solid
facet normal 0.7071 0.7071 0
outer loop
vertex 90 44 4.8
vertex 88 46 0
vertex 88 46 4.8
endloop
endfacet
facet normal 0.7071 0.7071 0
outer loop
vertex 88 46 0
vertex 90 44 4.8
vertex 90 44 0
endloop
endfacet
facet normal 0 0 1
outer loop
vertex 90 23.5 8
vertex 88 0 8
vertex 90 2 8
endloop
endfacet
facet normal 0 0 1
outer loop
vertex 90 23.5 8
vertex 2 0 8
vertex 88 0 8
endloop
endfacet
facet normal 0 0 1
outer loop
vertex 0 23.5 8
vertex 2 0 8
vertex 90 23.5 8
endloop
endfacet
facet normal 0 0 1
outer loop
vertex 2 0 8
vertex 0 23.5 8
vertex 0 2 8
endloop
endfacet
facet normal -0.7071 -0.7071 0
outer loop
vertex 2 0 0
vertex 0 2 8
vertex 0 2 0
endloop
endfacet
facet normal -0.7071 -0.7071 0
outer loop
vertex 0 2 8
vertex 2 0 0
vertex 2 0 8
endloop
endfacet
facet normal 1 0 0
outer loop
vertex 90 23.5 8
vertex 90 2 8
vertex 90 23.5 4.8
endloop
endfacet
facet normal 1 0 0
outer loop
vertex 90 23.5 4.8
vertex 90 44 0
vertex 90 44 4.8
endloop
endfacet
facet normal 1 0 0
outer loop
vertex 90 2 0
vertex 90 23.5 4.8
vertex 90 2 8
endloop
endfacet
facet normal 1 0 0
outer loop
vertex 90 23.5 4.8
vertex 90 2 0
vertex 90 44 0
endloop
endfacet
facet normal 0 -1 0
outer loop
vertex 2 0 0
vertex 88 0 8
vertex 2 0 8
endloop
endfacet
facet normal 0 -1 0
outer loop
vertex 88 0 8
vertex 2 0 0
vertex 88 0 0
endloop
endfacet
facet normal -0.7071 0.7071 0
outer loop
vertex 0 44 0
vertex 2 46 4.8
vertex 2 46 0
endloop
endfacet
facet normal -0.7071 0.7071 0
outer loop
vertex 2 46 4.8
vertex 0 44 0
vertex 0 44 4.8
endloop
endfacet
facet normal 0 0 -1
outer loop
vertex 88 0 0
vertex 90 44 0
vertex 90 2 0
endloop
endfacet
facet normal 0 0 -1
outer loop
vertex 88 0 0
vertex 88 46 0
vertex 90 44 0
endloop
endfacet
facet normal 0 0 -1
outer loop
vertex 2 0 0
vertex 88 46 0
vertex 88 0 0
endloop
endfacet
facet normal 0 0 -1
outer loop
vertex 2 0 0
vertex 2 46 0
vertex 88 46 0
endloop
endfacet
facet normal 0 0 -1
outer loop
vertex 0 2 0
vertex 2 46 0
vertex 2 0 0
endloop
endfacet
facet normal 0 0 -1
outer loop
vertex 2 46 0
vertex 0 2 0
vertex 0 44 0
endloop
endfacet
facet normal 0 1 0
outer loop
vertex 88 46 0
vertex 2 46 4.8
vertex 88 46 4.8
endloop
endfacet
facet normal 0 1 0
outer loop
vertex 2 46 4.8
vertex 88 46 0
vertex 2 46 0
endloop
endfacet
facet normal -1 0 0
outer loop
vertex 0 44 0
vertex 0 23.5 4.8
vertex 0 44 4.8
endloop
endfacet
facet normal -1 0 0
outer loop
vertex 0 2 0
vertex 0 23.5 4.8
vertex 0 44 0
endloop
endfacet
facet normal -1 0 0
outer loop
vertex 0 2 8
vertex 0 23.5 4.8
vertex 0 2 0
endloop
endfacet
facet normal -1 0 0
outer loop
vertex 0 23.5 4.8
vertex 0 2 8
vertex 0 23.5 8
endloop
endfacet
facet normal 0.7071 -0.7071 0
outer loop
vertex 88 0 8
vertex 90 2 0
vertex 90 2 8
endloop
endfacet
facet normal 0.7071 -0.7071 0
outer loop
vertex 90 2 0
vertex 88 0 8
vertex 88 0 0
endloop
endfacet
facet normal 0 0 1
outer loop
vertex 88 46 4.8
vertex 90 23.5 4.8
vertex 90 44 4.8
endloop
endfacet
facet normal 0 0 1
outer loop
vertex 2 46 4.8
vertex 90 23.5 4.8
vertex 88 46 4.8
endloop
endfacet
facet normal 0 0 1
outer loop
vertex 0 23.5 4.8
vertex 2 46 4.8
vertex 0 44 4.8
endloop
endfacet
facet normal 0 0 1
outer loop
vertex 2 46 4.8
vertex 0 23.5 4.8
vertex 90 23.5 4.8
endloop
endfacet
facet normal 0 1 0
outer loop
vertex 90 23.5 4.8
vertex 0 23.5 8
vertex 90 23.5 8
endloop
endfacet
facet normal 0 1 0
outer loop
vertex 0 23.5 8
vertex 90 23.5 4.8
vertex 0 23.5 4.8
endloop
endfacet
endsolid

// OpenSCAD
$fn = 32;

// ----------------------------------------------------------------------
// Stepped bar: sidestep, 90 x 46 x 8/4.8 mm
// ----------------------------------------------------------------------

// --- parameters (mm) ---
bar_l = 90;               // bar length, X
bar_w = 46;               // bar width, Y
plate_t = 8;              // thickness of the thick zone, Z
thin_t = 4.8;             // thickness of the thin zone
corner_c = 2;             // corner chamfer of the bar
step_cut = 3.2;           // material removed from the thin zone
ledge_y = 23.5;           // start of the ledge from the front edge
depth_1 = 3.2;            // depth of cut 1 from the top face

profile = [[2, 0], [88, 0], [90, 2], [90, 44], [88, 46], [2, 46], [0, 44], [0, 2]];  // primary outline, 8 points, counter clockwise
void_1 = [[-1, 23.5], [91, 23.5], [91, 47], [-1, 47]];  // ledge cut along one edge, 4 points

// --- the one profile operation ---
difference() {
  linear_extrude(height = plate_t) polygon(points = profile);
  translate([0, 0, plate_t - depth_1])
    linear_extrude(height = depth_1 + 1) polygon(points = void_1);
}
